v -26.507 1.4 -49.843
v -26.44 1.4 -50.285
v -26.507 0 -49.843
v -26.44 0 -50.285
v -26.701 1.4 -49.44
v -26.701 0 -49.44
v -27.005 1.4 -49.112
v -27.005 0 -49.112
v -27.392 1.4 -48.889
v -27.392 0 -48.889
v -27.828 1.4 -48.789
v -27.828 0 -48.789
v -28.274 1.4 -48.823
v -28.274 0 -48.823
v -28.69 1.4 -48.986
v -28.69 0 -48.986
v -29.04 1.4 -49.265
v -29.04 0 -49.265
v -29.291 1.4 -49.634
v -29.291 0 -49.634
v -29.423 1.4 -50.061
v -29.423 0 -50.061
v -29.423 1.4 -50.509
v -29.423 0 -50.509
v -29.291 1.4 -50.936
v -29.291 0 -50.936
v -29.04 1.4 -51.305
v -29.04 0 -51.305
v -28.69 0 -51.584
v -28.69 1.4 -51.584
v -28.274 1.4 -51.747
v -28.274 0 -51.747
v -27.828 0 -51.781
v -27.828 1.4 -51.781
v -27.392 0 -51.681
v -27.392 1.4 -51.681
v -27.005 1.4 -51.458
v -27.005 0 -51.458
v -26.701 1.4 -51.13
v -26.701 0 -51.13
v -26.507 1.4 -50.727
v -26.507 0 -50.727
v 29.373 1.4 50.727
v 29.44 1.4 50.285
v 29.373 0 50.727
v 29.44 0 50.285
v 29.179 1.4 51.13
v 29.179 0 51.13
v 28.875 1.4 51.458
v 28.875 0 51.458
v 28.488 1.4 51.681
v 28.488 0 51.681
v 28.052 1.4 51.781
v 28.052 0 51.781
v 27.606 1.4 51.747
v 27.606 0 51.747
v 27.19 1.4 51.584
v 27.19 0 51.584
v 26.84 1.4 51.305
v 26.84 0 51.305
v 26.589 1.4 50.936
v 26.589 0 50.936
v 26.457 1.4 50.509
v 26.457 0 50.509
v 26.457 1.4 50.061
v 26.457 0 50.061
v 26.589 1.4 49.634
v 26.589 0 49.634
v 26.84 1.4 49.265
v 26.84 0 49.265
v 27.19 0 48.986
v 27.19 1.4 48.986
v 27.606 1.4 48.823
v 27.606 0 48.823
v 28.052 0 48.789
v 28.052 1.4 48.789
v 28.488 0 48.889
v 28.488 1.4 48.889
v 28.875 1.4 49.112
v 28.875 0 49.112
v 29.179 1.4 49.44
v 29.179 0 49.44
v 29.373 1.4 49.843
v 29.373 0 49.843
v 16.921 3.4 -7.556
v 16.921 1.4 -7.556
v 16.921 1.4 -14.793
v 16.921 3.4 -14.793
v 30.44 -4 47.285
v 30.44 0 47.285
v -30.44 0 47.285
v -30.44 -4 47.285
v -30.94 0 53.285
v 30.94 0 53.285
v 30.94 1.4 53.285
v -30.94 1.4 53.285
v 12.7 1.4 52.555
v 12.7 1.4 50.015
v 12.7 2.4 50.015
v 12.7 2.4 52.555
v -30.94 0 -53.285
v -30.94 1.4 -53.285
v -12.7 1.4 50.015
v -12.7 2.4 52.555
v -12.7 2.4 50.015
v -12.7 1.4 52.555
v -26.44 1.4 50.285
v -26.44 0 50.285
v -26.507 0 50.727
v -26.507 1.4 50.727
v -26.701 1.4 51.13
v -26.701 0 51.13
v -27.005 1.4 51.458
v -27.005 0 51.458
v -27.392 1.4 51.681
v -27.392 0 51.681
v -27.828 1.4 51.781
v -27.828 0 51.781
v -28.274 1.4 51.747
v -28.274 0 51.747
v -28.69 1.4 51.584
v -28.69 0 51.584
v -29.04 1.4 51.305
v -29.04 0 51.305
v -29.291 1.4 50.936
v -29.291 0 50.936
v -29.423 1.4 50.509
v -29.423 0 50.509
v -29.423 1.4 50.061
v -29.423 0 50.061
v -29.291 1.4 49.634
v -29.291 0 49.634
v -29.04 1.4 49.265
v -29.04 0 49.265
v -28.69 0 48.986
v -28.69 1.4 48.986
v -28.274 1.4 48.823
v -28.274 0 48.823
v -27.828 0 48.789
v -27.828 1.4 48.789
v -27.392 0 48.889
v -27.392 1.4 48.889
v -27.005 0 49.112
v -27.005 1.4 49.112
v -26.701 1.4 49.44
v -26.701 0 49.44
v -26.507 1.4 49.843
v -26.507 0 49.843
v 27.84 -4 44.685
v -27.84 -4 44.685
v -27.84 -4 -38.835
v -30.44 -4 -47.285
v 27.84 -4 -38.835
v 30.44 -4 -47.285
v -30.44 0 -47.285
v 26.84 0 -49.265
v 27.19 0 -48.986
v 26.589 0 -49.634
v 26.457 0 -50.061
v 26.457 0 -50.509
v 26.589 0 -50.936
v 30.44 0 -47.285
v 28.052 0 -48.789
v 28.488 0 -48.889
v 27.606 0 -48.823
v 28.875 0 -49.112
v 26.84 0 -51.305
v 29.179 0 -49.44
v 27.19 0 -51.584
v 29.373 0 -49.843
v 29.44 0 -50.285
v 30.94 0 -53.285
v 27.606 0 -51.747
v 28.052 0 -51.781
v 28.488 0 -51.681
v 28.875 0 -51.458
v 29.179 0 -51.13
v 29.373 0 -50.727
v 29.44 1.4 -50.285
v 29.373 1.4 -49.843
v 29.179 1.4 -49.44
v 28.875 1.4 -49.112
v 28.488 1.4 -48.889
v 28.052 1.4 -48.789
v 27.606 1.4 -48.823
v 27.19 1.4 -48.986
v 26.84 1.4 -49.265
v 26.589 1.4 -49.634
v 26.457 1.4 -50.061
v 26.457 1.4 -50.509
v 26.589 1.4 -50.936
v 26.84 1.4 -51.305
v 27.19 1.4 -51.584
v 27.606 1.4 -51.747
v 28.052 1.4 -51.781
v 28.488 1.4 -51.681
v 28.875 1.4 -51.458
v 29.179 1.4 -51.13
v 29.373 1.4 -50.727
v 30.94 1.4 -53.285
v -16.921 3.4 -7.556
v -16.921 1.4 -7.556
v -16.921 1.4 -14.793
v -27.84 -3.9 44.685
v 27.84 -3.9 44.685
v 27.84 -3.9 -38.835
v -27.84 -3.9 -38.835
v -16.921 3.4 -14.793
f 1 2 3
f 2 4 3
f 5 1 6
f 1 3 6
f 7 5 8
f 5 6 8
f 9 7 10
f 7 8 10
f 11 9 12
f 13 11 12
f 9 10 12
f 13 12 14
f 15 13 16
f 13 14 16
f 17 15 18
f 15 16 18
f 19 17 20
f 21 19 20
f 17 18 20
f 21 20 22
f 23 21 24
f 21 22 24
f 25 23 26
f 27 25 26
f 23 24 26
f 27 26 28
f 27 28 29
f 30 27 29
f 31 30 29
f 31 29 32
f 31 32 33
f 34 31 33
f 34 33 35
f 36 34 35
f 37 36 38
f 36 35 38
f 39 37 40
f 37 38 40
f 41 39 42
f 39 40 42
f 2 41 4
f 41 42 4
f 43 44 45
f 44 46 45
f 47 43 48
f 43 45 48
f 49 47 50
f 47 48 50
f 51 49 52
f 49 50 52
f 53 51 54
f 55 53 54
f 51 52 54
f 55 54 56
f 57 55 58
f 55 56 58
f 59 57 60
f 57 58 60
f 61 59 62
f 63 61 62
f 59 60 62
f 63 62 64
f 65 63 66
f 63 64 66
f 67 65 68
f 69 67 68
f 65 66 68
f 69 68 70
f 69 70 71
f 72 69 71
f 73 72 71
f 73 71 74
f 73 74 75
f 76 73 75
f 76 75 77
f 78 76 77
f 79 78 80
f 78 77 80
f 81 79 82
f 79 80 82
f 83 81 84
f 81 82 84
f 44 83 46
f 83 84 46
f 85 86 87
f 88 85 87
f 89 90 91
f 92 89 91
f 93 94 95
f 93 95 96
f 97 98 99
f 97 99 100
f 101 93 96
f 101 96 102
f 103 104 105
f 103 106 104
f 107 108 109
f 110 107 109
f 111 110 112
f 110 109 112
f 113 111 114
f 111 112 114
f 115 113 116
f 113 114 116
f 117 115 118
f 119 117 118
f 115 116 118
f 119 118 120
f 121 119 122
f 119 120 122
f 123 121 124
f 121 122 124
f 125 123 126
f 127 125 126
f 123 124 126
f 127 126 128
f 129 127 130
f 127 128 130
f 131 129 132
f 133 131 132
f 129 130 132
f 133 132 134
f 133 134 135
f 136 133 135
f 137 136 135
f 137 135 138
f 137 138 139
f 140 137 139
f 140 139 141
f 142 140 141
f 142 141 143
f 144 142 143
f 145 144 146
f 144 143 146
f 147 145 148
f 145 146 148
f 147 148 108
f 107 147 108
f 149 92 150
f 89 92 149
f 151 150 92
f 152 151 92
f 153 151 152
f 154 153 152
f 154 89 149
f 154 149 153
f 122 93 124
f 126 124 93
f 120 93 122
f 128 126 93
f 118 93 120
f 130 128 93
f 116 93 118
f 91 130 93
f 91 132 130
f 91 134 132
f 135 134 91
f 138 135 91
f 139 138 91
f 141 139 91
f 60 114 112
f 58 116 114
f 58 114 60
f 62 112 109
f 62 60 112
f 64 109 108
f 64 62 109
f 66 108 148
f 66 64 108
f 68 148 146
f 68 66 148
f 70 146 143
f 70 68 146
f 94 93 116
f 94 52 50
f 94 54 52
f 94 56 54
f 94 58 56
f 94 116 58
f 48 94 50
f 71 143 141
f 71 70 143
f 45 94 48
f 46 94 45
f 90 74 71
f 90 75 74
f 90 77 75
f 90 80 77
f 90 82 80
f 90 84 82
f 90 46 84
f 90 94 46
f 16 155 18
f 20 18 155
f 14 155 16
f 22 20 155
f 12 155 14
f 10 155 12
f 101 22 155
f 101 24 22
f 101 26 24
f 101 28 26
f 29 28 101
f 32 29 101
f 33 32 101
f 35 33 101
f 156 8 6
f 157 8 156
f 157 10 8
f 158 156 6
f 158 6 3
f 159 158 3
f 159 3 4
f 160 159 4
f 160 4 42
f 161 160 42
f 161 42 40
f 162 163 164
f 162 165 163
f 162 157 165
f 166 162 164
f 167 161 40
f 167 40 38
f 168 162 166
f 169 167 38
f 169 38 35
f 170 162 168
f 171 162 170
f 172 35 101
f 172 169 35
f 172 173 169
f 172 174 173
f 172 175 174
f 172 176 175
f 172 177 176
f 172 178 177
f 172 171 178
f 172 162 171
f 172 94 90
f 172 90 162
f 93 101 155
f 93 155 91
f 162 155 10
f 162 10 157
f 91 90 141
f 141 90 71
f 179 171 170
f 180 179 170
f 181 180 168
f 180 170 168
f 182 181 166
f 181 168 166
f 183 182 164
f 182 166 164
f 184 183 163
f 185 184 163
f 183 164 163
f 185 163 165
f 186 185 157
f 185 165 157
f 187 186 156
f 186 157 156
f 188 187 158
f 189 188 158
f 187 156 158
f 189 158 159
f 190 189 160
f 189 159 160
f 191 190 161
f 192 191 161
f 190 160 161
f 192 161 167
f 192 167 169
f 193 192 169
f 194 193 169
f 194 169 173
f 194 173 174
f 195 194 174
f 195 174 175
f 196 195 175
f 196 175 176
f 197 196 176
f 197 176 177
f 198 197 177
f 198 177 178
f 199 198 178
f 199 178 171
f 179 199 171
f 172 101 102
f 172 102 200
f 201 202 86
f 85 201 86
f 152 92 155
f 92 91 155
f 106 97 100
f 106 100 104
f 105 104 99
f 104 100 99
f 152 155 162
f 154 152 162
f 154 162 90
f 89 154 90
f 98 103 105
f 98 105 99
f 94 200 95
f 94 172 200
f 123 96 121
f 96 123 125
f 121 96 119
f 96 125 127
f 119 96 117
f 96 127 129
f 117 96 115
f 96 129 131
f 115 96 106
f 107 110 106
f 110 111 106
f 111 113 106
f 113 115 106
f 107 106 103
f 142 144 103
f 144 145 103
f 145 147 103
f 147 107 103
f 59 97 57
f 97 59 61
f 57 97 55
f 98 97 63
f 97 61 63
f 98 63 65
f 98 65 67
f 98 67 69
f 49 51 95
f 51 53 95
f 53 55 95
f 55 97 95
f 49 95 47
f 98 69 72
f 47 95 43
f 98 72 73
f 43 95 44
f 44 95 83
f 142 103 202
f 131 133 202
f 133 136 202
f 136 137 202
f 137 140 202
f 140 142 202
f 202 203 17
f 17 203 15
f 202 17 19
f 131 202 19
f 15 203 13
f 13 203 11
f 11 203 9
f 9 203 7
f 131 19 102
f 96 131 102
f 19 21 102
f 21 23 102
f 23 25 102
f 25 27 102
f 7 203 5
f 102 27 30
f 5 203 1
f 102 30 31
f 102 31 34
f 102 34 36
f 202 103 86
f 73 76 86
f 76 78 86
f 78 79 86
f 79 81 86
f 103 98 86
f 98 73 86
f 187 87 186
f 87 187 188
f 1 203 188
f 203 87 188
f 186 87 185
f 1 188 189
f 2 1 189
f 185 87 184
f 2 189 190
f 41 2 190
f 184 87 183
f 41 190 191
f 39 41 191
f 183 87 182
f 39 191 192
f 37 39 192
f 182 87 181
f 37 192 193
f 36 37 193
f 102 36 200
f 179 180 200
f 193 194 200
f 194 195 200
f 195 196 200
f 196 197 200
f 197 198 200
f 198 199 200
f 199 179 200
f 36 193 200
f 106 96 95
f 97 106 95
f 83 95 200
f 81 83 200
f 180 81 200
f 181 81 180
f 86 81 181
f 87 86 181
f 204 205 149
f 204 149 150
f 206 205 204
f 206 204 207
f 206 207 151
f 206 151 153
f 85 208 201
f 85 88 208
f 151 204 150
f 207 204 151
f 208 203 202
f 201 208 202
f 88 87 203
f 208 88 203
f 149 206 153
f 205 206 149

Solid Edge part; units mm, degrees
sketch "Sketch1" plane through (0, 0, 0) normal (0, -1, 0) x (1, 0, 0)
  circle A0 centre (27.94, 50.285) radius 1.5
  line L0 (30.94, 53.285) -> (-30.94, 53.285)
  line L1 (-30.94, 53.285) -> (-30.94, -53.285)
  line L2 (-30.94, -53.285) -> (30.94, -53.285)
  line L3 (30.94, -53.285) -> (30.94, 53.285)
  circle A1 centre (-27.94, -50.285) radius 1.5
  circle A2 centre (-27.94, 50.285) radius 1.5
  circle A3 centre (27.94, -50.285) radius 1.5
  dimension "D1" = 61.88
  dimension "D2" = 106.57
  dimension "D3" = 3
  dimension "D4" = 3
  dimension "D5" = 3
  dimension "D6" = 3
  dimension "D7" = 3
extrude "Protrusion1" add sketch "Sketch1" against normal blind 1.4
sketch "Sketch2" plane through (0, 0, 0) normal (0, -1, 0) x (1, 0, 0)
  line L0 (30.44, 47.285) -> (-30.44, 47.285)
  line L1 (-30.44, 47.285) -> (-30.44, -47.285)
  line L2 (-30.44, -47.285) -> (30.44, -47.285)
  line L3 (30.44, -47.285) -> (30.44, 47.285)
  line L4 (27.84, 44.685) -> (-27.84, 44.685)
  line L5 (-27.84, 44.685) -> (-27.84, -38.835)
  line L6 (-27.84, -38.835) -> (27.84, -38.835)
  line L7 (27.84, -38.835) -> (27.84, 44.685)
  dimension "D1" = 60.88
  dimension "D2" = 94.57
  dimension "D3" = 0.5
  dimension "D4" = 6
  dimension "D5" = 55.68
  dimension "D6" = 83.52
  dimension "D7" = 8.6
extrude "ExtrudedProtrusion_2" add sketch "Sketch2" along normal blind 4
sketch "Sketch3" plane through (0, 0, 0) normal (0, -1, 0) x (1, 0, 0)
  line L0 (27.84, 44.685) -> (-27.84, 44.685)
  line L1 (-27.84, 44.685) -> (-27.84, -38.835)
  line L2 (-27.84, -38.835) -> (27.84, -38.835)
  line L3 (27.84, -38.835) -> (27.84, 44.685)
extrude "ExtrudedProtrusion_3" add sketch "Sketch3" along normal blind 2.229
sketch "Sketch4" plane through (0, 0, 0) normal (0, -1, 0) x (1, 0, 0)
  line L0 (12.7, 52.555) -> (-12.7, 52.555)
  line L1 (-12.7, 52.555) -> (-12.7, 50.015)
  line L2 (-12.7, 50.015) -> (12.7, 50.015)
  line L3 (12.7, 50.015) -> (12.7, 52.555)
extrude "ExtrudedProtrusion_4" add sketch "Sketch4" against normal blind 2.4
sketch "Sketch5" plane through (0, 1.4, 0) normal (0, 1, 0) x (-1, 0, 0)
  line L0 (16.9211, -14.7927) -> (16.9211, -7.556)
  line L1 (16.9211, -7.556) -> (-16.9211, -7.556)
  line L2 (-16.9211, -7.556) -> (-16.9211, -14.7927)
  line L3 (-16.9211, -14.7927) -> (16.9211, -14.7927)
extrude "ExtrudedProtrusion_5" add sketch "Sketch5" along normal blind 2
sketch "Sketch6" plane through (0, 0, 0) normal (0, -1, 0) x (1, 0, 0)
  line L0 (27.84, 44.685) -> (-27.84, 44.685)
  line L1 (-27.84, 44.685) -> (-27.84, -38.835)
  line L2 (-27.84, -38.835) -> (27.84, -38.835)
  line L3 (27.84, -38.835) -> (27.84, 44.685)
extrude "ExtrudedProtrusion_6" add sketch "Sketch6" along normal blind 3.9
properties material "Polycarbonate"
